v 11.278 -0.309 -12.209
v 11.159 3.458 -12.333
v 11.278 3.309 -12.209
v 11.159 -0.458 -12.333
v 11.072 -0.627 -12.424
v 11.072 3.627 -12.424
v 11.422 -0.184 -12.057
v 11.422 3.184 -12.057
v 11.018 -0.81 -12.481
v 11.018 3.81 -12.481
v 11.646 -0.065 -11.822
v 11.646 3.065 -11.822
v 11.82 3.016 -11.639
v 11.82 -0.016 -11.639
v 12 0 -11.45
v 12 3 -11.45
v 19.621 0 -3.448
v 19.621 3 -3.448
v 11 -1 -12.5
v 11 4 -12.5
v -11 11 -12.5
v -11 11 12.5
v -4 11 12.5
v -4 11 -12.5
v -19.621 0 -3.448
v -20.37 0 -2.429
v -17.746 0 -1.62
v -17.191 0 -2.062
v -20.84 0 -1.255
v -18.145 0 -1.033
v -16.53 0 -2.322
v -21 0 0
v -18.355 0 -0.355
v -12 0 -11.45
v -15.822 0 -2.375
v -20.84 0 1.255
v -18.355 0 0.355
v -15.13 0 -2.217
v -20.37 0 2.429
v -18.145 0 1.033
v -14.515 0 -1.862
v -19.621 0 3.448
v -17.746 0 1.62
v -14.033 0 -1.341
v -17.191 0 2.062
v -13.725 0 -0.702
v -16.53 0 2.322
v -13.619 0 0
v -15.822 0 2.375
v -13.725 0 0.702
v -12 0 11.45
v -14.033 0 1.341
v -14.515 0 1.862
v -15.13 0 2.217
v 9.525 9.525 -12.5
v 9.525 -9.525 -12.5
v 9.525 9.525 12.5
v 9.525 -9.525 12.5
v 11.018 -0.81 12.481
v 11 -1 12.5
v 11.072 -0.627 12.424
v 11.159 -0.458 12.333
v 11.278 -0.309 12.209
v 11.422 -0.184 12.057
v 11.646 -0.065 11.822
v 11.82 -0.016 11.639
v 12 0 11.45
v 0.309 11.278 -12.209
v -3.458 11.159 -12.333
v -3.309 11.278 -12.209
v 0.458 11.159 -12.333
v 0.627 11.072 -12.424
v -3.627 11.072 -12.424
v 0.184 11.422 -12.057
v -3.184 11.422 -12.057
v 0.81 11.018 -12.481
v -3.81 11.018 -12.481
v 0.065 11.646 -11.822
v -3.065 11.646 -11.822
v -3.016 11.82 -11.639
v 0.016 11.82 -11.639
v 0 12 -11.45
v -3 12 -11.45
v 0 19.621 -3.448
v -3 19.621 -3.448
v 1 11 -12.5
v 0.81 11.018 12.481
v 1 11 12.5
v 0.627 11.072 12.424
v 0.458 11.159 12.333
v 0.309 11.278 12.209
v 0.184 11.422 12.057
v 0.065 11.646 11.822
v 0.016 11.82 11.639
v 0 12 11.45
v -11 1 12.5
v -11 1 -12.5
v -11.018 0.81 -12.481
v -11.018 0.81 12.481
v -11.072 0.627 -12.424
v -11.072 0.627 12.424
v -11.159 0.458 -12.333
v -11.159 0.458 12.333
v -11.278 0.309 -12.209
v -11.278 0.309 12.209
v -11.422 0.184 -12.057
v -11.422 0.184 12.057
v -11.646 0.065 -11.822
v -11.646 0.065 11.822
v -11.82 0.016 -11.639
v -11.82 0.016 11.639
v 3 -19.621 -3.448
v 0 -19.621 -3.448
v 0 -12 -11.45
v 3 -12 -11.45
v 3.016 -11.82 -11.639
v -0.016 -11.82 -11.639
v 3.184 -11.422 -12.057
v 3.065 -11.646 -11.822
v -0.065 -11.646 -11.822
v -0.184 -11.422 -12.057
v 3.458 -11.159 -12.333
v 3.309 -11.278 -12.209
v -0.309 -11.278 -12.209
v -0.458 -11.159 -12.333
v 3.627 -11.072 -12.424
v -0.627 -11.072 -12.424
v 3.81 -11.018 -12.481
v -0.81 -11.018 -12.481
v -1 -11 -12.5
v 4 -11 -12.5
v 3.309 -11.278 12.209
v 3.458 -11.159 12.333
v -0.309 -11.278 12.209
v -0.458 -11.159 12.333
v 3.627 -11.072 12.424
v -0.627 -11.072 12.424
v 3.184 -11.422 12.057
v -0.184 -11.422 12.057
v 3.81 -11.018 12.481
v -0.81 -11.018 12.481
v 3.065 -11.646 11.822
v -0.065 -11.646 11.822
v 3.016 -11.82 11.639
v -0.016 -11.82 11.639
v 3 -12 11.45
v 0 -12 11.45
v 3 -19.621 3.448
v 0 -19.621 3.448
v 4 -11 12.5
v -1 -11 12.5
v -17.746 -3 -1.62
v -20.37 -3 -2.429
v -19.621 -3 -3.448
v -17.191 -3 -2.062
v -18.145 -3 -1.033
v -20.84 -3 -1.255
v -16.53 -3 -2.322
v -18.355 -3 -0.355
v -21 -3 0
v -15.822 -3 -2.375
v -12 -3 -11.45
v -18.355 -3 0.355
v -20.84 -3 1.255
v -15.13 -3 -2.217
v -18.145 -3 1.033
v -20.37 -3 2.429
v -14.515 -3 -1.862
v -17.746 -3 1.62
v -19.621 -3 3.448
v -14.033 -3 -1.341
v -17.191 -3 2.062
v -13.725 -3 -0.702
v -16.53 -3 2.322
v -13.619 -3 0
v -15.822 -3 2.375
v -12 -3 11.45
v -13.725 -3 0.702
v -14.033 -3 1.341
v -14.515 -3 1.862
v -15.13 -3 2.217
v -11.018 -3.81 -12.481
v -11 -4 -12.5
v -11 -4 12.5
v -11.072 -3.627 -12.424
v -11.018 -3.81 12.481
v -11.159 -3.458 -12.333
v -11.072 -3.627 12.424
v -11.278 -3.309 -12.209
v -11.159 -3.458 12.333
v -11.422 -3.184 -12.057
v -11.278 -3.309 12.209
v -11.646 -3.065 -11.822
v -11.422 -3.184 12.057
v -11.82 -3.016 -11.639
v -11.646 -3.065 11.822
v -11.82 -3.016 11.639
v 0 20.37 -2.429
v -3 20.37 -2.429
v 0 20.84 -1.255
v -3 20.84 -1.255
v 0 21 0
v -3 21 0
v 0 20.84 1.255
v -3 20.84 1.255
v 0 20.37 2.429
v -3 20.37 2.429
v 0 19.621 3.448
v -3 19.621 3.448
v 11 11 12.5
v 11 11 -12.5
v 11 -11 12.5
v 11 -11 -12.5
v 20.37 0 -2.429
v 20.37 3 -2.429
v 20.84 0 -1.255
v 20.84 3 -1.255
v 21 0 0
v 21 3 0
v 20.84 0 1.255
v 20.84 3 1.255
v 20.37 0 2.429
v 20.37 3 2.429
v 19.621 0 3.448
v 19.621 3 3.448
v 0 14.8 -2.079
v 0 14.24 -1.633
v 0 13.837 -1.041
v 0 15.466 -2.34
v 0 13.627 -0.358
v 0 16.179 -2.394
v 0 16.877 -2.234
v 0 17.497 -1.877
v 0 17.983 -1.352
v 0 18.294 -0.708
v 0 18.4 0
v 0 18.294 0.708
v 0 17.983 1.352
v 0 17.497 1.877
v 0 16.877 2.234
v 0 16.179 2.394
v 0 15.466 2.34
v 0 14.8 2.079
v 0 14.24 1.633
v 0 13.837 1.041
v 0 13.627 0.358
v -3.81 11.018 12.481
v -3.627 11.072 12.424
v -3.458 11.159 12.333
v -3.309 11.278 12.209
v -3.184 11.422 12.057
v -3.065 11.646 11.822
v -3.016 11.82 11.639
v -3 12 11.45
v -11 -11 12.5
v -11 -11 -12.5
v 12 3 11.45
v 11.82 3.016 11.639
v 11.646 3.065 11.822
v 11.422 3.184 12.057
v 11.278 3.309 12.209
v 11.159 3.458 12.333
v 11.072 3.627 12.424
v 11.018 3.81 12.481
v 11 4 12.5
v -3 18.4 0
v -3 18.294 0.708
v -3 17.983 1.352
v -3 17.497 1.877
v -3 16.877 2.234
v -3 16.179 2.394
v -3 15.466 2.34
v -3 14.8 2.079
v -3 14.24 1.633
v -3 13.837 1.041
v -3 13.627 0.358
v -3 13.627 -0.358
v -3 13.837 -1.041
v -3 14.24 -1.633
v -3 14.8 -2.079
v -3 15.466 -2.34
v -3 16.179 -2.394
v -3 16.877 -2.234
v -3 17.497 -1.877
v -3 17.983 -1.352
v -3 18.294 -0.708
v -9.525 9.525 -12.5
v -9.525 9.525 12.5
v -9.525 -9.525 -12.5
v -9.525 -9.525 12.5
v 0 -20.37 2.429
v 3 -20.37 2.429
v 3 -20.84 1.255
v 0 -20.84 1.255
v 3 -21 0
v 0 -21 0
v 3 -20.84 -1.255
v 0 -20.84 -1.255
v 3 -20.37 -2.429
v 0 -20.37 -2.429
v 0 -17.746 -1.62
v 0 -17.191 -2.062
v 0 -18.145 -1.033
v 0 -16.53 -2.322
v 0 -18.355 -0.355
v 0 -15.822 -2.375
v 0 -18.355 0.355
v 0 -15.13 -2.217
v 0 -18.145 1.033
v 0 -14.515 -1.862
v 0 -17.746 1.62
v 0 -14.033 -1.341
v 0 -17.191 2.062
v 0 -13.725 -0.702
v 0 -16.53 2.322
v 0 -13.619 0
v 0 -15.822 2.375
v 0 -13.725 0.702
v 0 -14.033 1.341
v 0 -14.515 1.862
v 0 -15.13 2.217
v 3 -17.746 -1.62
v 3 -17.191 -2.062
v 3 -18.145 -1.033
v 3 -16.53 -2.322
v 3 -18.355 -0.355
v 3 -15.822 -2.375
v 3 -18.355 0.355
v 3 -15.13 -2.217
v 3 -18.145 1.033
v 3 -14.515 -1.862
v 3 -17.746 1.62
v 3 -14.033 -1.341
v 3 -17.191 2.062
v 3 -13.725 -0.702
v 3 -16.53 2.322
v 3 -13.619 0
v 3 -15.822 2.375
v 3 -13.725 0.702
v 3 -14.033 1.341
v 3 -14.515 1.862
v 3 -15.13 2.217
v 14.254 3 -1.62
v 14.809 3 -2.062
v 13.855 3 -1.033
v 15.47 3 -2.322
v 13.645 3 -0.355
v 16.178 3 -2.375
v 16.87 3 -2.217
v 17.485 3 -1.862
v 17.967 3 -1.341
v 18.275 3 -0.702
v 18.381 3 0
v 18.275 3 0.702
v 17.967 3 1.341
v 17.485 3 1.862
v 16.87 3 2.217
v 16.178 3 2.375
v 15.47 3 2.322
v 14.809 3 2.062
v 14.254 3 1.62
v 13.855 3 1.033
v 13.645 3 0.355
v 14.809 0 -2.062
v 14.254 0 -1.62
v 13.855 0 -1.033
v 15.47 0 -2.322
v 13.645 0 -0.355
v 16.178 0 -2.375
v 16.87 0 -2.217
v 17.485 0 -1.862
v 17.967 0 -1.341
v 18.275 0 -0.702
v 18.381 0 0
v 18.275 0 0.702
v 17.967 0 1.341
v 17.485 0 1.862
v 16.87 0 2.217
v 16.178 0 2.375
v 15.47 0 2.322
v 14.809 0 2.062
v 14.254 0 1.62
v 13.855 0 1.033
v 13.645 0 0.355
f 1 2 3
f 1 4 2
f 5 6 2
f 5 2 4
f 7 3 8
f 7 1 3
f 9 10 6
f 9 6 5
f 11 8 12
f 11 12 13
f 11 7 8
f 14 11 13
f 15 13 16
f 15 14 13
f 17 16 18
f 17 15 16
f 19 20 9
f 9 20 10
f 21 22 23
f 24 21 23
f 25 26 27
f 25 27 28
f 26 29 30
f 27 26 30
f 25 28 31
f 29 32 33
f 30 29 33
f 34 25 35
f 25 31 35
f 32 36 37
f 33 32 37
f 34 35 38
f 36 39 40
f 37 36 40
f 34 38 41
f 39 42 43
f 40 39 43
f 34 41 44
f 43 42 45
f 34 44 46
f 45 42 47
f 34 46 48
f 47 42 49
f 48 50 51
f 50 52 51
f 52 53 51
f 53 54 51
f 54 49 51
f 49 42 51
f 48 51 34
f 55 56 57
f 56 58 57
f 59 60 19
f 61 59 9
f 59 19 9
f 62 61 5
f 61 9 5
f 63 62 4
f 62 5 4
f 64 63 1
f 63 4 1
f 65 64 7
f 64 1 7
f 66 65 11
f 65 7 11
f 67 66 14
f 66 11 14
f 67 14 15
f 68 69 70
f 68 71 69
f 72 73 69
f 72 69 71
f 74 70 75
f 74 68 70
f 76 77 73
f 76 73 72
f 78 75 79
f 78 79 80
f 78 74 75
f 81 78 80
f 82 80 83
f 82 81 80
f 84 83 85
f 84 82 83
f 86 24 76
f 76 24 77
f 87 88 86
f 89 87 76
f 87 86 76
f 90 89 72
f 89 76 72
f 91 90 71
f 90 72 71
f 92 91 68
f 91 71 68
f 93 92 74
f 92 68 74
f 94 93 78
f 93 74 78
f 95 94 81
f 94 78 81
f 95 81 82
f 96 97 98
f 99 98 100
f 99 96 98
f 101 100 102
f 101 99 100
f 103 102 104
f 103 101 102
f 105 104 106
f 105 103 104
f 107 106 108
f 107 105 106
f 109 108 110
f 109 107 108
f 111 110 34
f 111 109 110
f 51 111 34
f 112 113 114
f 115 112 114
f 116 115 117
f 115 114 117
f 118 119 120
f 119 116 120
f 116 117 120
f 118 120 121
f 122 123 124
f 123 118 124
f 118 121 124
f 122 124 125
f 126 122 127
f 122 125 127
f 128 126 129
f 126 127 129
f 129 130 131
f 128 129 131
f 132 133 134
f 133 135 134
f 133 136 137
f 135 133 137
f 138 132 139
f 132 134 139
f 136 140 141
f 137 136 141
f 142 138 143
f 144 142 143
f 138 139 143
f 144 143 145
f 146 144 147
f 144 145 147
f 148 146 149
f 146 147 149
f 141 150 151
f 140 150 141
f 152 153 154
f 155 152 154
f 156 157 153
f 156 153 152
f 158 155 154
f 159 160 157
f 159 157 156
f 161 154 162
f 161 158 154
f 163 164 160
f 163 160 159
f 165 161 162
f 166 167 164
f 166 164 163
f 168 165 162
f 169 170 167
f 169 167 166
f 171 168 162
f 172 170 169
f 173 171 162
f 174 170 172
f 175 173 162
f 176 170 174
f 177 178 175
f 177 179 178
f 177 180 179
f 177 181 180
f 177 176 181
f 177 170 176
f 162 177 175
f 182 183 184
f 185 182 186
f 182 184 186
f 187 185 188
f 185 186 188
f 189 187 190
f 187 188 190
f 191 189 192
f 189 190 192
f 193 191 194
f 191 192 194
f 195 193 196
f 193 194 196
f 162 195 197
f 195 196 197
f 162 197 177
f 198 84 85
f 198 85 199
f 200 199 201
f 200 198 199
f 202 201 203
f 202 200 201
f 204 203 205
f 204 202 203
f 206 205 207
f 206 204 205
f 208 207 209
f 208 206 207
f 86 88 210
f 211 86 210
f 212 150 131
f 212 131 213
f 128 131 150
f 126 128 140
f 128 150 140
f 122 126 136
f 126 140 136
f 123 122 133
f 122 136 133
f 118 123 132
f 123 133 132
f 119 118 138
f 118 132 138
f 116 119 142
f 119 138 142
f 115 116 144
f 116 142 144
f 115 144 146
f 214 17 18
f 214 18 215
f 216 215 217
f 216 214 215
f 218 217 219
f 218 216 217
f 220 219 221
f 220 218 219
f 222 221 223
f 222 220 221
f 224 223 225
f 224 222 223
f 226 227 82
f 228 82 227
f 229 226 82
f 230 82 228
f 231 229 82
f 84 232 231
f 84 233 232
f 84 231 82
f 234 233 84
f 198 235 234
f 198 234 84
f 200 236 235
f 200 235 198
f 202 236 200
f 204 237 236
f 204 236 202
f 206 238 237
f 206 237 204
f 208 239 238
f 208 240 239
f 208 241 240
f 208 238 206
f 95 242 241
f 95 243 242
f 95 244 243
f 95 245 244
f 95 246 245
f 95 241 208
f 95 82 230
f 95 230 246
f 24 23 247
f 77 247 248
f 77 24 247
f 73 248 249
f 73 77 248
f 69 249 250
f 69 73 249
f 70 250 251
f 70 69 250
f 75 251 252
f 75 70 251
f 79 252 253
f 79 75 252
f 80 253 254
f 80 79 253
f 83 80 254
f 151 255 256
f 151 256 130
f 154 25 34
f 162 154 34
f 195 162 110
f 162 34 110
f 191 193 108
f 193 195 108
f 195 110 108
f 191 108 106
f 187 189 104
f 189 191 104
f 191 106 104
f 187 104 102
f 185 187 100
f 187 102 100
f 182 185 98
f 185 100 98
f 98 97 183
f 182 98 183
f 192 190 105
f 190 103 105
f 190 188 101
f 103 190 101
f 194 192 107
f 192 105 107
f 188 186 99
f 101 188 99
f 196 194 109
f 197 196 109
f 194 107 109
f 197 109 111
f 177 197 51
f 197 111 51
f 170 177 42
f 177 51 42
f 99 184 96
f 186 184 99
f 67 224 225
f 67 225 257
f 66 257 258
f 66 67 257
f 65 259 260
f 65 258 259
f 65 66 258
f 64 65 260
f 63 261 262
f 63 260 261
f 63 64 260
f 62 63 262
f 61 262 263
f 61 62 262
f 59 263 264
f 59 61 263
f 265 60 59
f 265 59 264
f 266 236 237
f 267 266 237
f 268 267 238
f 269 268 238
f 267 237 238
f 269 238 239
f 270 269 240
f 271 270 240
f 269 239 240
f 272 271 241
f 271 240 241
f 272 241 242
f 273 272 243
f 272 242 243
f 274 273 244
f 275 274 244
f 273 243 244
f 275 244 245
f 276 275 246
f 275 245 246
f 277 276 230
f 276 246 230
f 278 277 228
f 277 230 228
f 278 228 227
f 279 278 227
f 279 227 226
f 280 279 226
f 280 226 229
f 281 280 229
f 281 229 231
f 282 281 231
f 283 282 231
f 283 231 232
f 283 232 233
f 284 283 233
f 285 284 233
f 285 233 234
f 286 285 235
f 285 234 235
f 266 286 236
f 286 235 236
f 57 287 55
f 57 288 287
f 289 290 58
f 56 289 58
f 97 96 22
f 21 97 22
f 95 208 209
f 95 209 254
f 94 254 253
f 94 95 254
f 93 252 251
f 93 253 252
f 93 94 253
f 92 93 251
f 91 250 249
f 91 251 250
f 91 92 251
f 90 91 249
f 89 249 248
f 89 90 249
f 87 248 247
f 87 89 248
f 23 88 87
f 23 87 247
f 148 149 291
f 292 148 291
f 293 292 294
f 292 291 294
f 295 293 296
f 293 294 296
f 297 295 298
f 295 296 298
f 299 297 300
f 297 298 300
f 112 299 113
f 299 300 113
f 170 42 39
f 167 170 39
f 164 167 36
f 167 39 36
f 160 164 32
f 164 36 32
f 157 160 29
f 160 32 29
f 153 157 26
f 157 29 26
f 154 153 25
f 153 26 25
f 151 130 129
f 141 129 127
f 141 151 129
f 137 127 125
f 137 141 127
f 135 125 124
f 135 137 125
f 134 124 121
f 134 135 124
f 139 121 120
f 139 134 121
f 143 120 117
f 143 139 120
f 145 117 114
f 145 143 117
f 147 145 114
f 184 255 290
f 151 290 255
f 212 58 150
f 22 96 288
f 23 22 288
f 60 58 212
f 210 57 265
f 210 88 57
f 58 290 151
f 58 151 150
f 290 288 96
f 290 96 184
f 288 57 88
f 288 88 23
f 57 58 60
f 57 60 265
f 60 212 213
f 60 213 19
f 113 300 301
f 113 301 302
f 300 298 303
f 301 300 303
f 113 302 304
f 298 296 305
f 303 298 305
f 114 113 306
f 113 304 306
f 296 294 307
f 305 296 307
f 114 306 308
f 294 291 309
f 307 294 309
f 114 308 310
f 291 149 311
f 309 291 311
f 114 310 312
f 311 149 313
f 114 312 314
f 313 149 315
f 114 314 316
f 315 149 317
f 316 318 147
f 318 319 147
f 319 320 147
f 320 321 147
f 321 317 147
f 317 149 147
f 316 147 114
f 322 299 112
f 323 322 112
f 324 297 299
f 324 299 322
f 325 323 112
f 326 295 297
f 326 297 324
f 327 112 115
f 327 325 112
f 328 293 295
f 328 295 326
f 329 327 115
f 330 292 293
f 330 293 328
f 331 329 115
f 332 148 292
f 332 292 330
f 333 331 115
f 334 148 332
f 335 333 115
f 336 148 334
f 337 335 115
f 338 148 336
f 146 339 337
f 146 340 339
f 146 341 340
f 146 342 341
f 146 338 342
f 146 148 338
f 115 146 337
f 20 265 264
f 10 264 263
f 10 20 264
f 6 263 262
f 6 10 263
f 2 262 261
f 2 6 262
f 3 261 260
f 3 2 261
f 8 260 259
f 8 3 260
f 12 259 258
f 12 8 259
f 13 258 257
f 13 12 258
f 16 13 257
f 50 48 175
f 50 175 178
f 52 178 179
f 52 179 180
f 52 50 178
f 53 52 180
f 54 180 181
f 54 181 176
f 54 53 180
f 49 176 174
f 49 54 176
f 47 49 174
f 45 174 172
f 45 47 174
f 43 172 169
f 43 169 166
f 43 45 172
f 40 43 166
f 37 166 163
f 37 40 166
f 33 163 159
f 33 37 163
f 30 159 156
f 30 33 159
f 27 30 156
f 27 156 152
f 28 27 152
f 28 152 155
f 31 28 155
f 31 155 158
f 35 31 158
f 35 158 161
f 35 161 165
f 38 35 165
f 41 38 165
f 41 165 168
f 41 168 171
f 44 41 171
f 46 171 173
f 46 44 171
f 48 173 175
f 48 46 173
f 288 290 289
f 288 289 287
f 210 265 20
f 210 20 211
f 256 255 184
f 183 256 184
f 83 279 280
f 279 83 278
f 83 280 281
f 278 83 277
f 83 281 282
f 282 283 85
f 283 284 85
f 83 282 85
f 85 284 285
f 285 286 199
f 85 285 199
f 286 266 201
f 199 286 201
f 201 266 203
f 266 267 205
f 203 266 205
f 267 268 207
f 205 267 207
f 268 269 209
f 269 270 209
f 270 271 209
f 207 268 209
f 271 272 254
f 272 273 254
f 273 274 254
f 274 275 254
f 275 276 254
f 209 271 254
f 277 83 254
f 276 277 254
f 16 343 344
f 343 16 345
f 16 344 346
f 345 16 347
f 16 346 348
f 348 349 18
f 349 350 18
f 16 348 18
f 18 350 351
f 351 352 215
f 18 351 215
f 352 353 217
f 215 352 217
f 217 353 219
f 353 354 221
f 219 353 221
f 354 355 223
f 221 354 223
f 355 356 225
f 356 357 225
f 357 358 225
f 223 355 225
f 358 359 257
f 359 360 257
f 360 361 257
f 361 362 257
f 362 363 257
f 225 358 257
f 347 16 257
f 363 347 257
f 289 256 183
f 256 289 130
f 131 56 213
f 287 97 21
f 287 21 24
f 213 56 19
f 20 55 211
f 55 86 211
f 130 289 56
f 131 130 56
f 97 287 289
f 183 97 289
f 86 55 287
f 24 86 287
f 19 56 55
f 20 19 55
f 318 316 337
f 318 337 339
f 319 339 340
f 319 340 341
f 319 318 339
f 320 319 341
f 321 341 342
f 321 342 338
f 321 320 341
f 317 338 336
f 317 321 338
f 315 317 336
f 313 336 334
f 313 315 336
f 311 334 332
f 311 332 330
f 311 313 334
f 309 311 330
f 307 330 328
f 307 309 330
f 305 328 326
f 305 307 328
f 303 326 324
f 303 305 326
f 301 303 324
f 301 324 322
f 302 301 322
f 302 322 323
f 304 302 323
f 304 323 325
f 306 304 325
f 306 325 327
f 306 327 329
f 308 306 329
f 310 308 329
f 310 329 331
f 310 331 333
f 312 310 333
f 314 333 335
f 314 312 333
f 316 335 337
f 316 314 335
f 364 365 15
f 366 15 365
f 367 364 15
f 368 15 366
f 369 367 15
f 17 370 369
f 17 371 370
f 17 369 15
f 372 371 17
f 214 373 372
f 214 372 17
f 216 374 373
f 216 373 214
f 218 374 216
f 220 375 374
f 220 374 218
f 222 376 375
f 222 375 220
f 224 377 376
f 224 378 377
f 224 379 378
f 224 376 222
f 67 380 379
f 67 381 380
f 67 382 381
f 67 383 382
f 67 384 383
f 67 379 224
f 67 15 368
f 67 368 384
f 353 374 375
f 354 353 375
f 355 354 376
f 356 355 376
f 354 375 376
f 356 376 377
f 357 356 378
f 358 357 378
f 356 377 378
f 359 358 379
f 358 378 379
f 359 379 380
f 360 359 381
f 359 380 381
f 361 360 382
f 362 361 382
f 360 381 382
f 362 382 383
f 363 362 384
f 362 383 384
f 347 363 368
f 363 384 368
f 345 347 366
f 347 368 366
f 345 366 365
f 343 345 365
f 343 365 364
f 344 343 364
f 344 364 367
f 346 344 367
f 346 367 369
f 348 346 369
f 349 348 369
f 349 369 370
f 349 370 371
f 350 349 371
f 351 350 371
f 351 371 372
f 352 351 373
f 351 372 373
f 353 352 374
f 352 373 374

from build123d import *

# Parameters (mm, degrees)
F0_W     = 22
F0_H     = 22
F0_W_2   = 19.05
F0_H_2   = 19.05
F1_DEPTH = 12.5
F2_R     = 2.38125
F3_DEPTH = 3
F4_R     = 2.38125
F5_DEPTH = 3
F6_R     = 2.38125
F7_DEPTH = 3
F8_R     = 2.4003
F9_DEPTH = 3
F10_R    = 1


# Not quite as in the source:
# - a feature names something its author has since deleted; it is built from what else it names


with BuildPart() as f1:
    # F0 (on Top) → F1 (new body, symmetric)
    with BuildSketch(Plane.XY):
        Rectangle(F0_W, F0_H)
        Rectangle(F0_W_2, F0_H_2, mode=Mode.SUBTRACT)
    extrude(amount=F1_DEPTH, both=True)

    # F2 (on Front) → F3 (join)
    with BuildSketch(Plane.XZ):
        with BuildLine():
            Line((-11, -12.5), (-11, 12.5))
            Line((-11, 12.5), (-19.6206896552, 3.4482758621))
            ThreePointArc((-19.6206896552, 3.4482758621), (-21, 0), (-19.6206896552, -3.4482758621))
            Line((-19.6206896552, -3.4482758621), (-11, -12.5))
        make_face()
        with Locations((-16, 0)):
            Circle(F2_R, mode=Mode.SUBTRACT)
    extrude(amount=F3_DEPTH)

    # F4 (on Right) → F5 (join)
    with BuildSketch(Plane.YZ):
        with BuildLine():
            Line((-11, 12.5), (-19.6206896552, 3.4482758621))
            ThreePointArc((-19.6206896552, 3.4482758621), (-21, 0), (-19.6206896552, -3.4482758621))
            Line((-19.6206896552, -3.4482758621), (-11, -12.5))
            Line((-11, -12.5), (-11, 12.5))
        make_face()
        with Locations((-16, 0)):
            Circle(F4_R, mode=Mode.SUBTRACT)
    extrude(amount=F5_DEPTH)

    # F6 (on Front) → F7 (join)
    with BuildSketch(Plane.XZ):
        with BuildLine():
            Line((11, -12.5), (19.6206896552, -3.4482758621))
            ThreePointArc((19.6206896552, -3.4482758621), (21, 0), (19.6206896552, 3.4482758621))
            Line((19.6206896552, 3.4482758621), (11, 12.5))
            Line((11, 12.5), (11, -12.5))
        make_face()
        with Locations((16, 0)):
            Circle(F6_R, mode=Mode.SUBTRACT)
    extrude(amount=-F7_DEPTH)

    # F8 (on Right) → F9 (join)
    with BuildSketch(Plane.YZ):
        with BuildLine():
            ThreePointArc((19.6206896552, -3.4482758621), (21, 0), (19.6206896552, 3.4482758621))
            Line((19.6206896552, 3.4482758621), (11, 12.5))
            Line((11, 12.5), (11, -12.5))
            Line((11, -12.5), (19.6206896552, -3.4482758621))
        make_face()
        with Locations((16, 0)):
            Circle(F8_R, mode=Mode.SUBTRACT)
    extrude(amount=-F9_DEPTH)

    # F10
    f10_edges = [f1.edges().sort_by_distance(p)[0] for p in [
        (-11, -3, 0),
        (0, -11, 0),
        (3, -11, 0),
        (-11, 0, 0),
        (11, 0, 0),
        (11, 3, 0),
        (0, 11, 0),
        (-3, 11, 0),
    ]]
    fillet(f10_edges, radius=F10_R)


solid = f1.part
